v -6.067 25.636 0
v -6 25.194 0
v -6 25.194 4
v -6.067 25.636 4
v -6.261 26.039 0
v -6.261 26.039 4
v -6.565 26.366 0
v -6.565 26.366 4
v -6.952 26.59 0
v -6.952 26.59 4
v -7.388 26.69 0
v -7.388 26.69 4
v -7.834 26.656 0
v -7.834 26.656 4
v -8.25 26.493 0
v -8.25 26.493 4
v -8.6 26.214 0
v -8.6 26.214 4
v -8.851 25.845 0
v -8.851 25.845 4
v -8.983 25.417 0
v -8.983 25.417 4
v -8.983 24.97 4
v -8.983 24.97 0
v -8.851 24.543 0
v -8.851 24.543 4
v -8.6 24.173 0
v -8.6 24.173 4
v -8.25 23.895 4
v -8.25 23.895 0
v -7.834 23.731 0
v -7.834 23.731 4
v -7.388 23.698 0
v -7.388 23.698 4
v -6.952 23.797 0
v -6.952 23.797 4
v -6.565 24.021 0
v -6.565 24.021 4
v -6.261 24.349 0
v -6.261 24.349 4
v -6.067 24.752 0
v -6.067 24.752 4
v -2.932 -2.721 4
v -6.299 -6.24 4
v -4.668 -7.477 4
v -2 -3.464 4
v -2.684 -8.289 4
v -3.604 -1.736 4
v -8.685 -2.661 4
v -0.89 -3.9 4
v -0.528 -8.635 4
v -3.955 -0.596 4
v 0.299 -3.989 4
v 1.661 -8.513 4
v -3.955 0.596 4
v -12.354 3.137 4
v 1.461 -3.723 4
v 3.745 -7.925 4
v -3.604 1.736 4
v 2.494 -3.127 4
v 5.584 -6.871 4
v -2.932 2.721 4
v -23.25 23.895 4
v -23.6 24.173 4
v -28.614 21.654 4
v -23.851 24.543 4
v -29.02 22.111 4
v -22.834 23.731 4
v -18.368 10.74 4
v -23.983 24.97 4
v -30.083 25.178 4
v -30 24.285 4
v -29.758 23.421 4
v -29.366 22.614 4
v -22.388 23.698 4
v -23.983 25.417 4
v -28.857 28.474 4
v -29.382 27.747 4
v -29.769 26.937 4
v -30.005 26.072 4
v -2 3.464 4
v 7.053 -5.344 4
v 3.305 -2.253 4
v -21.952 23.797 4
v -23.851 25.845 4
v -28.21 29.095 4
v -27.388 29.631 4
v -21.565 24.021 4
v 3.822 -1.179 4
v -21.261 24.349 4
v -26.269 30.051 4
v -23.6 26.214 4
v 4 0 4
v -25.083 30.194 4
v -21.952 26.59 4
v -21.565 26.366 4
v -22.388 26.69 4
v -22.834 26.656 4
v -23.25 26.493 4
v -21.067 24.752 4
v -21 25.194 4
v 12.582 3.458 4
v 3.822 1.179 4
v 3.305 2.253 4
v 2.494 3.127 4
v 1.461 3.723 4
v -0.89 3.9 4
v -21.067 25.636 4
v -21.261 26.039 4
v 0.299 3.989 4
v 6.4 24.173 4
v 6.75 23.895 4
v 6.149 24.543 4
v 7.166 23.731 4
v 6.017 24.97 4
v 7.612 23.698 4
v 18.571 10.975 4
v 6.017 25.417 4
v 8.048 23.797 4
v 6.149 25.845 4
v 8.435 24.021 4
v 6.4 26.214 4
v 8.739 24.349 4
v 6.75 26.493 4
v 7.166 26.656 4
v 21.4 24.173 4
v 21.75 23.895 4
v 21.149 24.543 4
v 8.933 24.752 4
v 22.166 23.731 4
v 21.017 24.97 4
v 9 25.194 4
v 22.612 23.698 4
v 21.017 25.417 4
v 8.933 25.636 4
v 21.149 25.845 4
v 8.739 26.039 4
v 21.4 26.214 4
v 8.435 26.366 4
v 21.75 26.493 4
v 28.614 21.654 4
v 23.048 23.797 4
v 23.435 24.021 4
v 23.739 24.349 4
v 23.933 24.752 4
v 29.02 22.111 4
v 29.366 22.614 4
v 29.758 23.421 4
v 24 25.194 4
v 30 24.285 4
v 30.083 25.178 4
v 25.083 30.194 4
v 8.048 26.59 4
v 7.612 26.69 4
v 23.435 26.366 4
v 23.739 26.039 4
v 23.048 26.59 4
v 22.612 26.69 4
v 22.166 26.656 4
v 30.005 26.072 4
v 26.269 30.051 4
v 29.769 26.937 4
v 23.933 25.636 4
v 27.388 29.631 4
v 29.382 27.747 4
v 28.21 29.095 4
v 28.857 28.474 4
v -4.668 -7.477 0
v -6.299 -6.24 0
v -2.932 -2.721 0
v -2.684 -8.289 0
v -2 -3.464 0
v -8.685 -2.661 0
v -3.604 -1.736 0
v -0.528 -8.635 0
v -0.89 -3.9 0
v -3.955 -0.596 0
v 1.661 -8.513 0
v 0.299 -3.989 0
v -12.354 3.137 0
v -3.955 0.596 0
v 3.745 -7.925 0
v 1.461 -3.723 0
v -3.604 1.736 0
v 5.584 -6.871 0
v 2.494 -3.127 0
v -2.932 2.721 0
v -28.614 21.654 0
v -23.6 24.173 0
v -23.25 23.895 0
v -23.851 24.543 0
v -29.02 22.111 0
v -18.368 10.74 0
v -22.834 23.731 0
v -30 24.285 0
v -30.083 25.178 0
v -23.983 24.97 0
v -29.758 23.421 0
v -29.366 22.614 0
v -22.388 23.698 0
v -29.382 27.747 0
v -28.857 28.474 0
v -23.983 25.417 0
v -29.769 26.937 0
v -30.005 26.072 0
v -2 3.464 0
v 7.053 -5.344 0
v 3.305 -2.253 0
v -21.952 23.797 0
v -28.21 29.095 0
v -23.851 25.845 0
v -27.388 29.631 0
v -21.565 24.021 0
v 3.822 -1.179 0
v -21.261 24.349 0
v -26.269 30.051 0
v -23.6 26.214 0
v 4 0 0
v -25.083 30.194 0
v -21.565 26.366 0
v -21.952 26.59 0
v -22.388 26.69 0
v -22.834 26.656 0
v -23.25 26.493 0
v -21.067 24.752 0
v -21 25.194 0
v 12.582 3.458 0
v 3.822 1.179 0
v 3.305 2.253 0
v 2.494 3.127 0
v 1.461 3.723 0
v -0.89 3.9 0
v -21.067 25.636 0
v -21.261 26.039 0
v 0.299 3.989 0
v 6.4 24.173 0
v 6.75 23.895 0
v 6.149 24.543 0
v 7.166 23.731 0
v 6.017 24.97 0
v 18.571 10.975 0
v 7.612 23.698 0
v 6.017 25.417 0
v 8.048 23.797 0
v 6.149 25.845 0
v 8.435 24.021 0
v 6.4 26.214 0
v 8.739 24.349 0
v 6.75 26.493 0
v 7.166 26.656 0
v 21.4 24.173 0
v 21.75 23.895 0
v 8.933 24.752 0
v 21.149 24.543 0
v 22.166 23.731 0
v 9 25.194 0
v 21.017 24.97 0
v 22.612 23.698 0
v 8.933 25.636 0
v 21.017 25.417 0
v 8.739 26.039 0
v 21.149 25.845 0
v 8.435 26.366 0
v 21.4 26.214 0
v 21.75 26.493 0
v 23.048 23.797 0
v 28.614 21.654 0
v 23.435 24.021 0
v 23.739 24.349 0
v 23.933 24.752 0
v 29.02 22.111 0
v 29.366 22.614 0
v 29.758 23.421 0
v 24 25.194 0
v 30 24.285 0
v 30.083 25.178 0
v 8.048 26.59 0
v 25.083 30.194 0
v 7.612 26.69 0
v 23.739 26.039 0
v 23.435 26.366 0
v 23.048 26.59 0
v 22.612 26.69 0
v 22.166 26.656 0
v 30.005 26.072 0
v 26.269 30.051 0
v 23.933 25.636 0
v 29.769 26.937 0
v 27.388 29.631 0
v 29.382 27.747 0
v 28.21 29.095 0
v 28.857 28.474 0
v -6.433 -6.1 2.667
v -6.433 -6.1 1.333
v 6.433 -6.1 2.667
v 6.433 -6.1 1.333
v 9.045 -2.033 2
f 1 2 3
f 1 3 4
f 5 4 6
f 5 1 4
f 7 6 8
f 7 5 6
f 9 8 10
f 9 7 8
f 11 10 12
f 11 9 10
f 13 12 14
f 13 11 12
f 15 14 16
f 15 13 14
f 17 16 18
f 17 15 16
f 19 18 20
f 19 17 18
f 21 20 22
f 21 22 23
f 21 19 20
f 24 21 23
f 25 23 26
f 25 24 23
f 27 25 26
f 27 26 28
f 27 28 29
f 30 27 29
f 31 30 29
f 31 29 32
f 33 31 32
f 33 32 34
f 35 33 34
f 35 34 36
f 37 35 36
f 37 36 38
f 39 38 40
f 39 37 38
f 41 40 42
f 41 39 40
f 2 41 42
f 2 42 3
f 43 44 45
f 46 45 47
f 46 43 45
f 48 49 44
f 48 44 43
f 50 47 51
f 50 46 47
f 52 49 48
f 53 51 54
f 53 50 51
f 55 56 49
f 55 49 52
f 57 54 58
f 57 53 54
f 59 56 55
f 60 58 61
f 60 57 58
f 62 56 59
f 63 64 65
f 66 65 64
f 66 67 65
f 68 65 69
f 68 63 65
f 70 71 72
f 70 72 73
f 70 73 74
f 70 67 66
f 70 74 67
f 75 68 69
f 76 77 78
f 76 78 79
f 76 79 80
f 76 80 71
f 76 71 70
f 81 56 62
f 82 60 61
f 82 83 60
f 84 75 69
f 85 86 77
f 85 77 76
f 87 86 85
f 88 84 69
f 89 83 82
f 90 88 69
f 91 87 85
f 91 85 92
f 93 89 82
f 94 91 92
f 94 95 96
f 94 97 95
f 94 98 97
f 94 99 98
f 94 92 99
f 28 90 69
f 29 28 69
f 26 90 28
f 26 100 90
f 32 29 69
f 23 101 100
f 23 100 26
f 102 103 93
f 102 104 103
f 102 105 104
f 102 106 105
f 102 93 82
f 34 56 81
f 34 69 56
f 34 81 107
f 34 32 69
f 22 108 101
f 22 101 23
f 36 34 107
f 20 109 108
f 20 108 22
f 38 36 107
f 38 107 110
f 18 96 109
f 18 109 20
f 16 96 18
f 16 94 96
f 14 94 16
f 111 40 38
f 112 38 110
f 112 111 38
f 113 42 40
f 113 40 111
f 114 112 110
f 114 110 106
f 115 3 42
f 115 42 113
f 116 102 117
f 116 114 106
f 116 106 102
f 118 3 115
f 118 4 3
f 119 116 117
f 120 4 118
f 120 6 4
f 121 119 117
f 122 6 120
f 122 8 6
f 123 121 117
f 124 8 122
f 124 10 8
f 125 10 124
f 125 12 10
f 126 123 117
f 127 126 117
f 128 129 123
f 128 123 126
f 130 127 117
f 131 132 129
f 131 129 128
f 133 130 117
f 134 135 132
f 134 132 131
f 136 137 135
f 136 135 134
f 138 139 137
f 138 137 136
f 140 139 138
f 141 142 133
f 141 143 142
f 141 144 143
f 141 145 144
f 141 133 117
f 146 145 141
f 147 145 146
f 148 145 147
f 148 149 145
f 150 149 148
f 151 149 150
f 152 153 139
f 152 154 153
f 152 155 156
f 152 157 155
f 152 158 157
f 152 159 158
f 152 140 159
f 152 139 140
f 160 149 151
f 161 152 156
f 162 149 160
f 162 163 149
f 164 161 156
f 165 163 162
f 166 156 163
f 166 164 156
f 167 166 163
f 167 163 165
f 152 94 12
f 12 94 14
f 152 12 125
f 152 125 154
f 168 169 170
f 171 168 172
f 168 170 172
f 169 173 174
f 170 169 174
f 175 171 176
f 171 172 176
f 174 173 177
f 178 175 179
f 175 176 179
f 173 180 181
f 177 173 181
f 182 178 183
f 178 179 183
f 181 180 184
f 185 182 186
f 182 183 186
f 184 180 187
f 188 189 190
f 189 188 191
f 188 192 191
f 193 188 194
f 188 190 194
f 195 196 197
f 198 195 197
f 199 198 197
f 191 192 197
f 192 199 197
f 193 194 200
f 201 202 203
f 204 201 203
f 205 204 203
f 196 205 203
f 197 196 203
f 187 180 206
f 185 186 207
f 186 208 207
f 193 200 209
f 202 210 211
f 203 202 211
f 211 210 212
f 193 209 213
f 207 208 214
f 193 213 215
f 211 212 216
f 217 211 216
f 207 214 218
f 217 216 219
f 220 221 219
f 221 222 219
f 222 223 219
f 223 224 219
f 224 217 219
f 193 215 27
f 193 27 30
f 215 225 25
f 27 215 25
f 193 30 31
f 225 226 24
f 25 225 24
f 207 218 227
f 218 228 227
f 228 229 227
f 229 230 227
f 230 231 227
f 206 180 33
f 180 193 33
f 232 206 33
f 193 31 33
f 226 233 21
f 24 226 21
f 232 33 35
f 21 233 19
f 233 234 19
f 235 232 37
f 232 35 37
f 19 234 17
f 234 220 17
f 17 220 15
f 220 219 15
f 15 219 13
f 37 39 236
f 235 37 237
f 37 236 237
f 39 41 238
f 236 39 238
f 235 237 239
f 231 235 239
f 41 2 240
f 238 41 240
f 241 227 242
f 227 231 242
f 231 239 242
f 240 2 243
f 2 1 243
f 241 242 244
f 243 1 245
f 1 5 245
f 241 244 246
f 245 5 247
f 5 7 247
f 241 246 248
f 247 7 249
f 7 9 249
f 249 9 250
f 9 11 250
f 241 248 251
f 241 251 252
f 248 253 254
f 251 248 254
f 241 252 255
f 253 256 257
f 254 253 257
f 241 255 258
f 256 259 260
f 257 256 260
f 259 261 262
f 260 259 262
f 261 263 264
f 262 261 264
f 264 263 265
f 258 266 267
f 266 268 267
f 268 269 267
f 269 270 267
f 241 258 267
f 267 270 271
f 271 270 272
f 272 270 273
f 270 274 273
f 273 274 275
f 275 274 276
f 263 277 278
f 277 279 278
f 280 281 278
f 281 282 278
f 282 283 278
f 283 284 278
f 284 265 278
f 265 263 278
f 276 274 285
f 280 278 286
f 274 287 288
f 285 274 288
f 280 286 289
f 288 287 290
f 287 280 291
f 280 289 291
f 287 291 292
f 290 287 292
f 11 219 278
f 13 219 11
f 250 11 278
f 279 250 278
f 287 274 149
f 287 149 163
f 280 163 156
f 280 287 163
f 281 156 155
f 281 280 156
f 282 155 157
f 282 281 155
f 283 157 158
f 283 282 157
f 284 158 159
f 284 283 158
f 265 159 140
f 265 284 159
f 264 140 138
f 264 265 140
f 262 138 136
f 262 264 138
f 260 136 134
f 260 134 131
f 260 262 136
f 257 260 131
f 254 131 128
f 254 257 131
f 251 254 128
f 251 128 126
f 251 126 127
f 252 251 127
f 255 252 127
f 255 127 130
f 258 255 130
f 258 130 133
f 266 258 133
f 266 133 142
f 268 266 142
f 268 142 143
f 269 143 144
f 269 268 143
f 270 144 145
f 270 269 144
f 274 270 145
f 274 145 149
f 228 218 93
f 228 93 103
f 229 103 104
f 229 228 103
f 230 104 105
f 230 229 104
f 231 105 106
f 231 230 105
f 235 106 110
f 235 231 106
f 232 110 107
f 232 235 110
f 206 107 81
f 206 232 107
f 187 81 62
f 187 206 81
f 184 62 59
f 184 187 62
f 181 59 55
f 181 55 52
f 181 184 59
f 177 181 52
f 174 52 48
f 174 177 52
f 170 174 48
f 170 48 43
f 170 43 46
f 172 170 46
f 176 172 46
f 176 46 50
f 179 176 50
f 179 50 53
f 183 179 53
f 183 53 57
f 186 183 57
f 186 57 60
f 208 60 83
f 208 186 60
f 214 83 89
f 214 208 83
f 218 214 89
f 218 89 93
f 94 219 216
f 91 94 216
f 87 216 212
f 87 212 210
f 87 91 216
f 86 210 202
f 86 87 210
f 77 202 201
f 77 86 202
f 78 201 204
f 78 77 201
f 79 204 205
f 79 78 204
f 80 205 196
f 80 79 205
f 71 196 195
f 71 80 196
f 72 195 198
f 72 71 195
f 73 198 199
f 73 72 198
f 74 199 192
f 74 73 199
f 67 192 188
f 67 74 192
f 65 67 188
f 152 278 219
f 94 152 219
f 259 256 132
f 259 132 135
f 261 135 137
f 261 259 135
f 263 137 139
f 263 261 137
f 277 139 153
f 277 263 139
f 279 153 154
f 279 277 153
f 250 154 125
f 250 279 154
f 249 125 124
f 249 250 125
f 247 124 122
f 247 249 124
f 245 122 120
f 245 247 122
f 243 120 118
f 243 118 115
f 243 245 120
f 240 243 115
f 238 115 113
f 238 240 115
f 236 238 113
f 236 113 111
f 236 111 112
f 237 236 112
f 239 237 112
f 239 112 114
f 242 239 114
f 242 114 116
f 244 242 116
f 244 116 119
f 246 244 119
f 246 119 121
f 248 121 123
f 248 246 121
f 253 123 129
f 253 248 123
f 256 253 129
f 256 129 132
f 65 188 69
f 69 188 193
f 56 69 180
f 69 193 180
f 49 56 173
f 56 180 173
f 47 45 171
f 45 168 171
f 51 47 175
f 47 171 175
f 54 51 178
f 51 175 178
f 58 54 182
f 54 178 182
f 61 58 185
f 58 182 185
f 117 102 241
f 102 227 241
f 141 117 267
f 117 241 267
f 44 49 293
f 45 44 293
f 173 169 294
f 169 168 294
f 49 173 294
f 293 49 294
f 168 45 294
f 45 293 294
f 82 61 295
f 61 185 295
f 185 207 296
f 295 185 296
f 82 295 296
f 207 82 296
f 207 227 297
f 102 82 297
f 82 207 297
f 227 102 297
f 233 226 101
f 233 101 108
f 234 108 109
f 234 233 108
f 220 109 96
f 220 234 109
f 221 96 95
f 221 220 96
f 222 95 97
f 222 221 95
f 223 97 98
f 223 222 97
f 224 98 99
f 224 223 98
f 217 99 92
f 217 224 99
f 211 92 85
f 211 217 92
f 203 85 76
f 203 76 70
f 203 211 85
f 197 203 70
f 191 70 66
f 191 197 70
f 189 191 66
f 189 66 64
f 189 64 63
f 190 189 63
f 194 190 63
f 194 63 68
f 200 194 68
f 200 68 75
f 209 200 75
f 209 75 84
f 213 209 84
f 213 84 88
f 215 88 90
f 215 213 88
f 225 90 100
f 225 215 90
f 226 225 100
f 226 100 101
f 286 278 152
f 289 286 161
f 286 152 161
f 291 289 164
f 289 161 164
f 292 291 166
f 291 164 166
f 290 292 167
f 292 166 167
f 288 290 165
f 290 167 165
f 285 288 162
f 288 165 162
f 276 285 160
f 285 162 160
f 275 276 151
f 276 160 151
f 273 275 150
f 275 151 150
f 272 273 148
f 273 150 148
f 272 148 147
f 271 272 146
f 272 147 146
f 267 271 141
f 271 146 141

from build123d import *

# Parameters (mm, degrees)
SKETCH_R   = 1.5
SKETCH_R_2 = 4
PAD_DEPTH  = 4
FILLET_R   = 5


with BuildPart() as part:
    # Sketch → Pad (new body)
    with BuildSketch(Plane.XY):
        with BuildLine():
            Line((37.5, 30.193726), (-37.5, 30.193726))
            add(Edge.make_bspline(
                [(-37.5, 30.193726), (-9.441921, 4.091486), (-9.774633, -9.497281), (9.774633, -9.497281), (9.441921, 4.091486), (37.5, 30.193726)],
                knots=[0, 0, 0, 0, 0.333333, 0.666667, 1, 1, 1, 1], degree=3))
        make_face()
        with Locations((-22.5, 25.193726)):
            Circle(SKETCH_R, mode=Mode.SUBTRACT)
        with Locations((-7.5, 25.193726)):
            Circle(SKETCH_R, mode=Mode.SUBTRACT)
        with Locations((7.5, 25.193726)):
            Circle(SKETCH_R, mode=Mode.SUBTRACT)
        with Locations((22.5, 25.193726)):
            Circle(SKETCH_R, mode=Mode.SUBTRACT)
        Circle(SKETCH_R_2, mode=Mode.SUBTRACT)
    extrude(amount=PAD_DEPTH)

    # Fillet
    fillet_edges = [part.edges().sort_by_distance(p)[0] for p in [
        (37.5, 30.193726, 2),
        (-37.5, 30.193726, 2),
    ]]
    fillet(fillet_edges, radius=FILLET_R)


solid = part.part
